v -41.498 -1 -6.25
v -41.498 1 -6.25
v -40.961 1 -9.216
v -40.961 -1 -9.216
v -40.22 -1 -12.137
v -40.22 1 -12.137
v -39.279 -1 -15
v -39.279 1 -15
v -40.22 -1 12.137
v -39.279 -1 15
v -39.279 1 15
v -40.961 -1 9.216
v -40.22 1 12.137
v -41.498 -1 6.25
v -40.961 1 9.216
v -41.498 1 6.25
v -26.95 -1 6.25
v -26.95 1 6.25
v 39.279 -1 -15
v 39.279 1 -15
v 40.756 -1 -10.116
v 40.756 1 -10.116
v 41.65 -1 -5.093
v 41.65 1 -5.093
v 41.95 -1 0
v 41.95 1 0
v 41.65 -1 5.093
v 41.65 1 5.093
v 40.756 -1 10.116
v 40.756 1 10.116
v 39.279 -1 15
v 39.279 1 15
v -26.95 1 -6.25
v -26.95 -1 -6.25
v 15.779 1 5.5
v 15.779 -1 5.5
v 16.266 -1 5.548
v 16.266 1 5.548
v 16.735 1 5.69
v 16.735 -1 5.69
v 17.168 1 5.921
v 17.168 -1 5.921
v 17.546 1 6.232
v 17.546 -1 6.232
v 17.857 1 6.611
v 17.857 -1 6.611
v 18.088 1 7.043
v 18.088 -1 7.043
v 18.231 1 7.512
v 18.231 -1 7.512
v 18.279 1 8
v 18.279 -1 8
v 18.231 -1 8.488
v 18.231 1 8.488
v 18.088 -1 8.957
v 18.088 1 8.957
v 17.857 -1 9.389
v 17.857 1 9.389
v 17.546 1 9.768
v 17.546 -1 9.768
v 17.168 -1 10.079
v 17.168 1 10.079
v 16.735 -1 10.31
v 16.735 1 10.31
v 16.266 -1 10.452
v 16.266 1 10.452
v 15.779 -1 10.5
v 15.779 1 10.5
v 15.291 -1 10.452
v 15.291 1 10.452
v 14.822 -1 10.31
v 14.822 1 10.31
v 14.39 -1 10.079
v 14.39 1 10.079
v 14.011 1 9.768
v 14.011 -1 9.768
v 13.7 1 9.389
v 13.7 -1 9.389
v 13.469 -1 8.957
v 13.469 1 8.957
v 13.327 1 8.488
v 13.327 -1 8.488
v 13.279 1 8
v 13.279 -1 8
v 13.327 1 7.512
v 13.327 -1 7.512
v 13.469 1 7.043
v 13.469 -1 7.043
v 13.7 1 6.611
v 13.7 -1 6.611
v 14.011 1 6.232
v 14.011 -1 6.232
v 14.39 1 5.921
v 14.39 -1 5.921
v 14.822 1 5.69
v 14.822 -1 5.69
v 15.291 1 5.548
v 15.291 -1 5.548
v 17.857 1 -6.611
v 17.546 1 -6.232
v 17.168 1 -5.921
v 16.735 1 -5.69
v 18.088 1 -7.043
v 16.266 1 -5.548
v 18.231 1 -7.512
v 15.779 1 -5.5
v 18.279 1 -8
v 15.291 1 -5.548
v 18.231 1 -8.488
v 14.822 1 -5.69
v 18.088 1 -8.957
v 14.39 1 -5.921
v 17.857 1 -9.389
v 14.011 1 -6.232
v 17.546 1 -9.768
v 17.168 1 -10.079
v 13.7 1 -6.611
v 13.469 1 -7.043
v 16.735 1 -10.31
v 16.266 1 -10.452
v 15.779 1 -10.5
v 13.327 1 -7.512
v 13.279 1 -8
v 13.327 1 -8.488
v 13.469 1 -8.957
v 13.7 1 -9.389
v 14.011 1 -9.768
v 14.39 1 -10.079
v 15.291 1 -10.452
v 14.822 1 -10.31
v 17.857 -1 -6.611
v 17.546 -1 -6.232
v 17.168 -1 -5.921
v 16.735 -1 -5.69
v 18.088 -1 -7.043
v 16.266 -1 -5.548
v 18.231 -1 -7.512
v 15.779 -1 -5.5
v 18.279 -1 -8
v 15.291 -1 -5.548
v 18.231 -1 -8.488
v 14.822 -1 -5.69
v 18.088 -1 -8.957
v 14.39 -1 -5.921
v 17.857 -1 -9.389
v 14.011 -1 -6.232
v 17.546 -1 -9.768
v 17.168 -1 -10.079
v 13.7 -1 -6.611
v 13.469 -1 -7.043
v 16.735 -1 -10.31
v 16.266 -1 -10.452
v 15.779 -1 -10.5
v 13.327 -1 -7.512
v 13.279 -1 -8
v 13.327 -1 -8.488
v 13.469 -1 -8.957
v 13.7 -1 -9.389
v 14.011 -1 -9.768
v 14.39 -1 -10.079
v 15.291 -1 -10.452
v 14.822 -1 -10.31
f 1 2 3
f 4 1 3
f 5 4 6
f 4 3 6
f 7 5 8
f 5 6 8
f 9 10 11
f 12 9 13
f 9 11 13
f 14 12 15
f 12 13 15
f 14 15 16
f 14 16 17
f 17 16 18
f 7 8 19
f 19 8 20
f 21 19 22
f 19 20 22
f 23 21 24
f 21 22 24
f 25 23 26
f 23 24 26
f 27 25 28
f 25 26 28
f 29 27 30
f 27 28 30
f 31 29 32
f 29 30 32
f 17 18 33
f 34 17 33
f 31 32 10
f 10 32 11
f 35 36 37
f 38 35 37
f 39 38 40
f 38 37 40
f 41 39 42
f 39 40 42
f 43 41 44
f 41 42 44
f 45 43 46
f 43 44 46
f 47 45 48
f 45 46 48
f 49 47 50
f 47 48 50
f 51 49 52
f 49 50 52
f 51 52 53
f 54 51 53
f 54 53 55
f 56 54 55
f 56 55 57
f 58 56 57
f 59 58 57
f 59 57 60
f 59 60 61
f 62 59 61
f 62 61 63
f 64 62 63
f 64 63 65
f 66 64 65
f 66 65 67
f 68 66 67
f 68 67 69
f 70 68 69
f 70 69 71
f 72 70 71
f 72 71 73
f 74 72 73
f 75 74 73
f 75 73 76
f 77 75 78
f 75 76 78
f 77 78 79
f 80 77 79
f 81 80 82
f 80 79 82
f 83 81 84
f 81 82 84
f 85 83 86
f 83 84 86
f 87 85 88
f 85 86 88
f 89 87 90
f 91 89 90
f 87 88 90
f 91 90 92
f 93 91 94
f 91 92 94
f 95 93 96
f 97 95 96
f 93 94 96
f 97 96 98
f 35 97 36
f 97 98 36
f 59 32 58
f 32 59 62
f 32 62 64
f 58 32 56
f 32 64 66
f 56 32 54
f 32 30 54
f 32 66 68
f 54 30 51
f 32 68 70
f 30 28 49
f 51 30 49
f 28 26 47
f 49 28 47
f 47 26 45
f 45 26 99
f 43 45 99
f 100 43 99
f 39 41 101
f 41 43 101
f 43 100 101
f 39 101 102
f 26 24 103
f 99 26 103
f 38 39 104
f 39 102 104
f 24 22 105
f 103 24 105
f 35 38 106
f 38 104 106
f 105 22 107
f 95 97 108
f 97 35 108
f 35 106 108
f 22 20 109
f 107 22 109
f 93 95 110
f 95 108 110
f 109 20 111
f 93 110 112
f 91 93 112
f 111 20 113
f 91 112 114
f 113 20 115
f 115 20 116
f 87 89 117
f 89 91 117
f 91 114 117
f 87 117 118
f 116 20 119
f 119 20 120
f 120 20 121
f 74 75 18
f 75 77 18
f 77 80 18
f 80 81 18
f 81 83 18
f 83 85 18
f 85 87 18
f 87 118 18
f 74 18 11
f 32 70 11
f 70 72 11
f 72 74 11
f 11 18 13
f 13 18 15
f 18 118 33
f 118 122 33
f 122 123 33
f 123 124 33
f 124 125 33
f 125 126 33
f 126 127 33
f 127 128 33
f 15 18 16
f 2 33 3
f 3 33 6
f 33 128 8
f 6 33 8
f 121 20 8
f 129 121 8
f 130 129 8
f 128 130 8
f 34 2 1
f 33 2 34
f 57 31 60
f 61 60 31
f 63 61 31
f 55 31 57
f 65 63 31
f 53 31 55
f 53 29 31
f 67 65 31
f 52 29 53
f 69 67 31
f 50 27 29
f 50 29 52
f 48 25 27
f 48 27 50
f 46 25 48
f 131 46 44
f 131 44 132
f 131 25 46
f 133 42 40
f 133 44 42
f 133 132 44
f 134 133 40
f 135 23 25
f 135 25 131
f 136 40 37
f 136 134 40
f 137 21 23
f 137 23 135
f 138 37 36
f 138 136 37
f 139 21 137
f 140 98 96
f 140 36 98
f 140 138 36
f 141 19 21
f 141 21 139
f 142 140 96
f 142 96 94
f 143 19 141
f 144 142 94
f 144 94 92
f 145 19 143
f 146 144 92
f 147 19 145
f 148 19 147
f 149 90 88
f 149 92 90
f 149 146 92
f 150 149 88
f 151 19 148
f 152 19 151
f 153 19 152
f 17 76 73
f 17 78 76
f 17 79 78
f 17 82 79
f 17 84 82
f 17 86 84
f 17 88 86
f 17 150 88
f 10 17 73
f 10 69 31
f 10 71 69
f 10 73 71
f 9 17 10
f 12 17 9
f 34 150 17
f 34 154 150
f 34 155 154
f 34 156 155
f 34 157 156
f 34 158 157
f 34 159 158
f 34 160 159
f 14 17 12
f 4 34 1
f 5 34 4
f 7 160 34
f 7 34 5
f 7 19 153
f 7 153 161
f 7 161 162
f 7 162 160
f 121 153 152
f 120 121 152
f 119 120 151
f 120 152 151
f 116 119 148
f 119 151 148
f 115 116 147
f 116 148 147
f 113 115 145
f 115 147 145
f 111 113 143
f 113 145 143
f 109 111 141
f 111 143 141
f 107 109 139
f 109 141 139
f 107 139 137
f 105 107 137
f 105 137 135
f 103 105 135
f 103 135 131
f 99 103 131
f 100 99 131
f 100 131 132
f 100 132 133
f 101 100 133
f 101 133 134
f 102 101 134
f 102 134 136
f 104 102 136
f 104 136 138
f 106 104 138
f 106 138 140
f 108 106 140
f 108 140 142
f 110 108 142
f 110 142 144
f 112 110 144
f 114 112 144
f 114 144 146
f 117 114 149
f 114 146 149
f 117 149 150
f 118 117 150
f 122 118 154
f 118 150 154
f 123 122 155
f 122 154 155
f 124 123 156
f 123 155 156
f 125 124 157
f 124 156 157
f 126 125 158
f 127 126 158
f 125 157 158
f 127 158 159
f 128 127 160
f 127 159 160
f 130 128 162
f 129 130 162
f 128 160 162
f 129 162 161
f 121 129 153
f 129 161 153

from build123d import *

# Parameters (mm, degrees)
BOSS_EXTRUDE1_DEPTH = 1
CUT_EXTRUDE1_REACH  = 46.596
SKETCH2_W           = 30
SKETCH2_H           = 12.5
CUT_EXTRUDE2_REACH  = 46.596
SKETCH3_R           = 2.5


with BuildPart() as part:
    # Sketch1 → Boss-Extrude1 (new, symmetric)
    with BuildSketch(Plane(origin=(0, 0, 0), x_dir=(1, 0, 0), z_dir=(0, 1, 0))):
        with BuildLine():
            Line((-39.278701549, 15), (39.278701549, 15))
            ThreePointArc((39.278701549, 15), (41.95, 0), (39.278701549, -15))
            Line((39.278701549, -15), (-39.278701549, -15))
            ThreePointArc((-39.278701549, -15), (-41.95, 0), (-39.278701549, 15))
        make_face()
    extrude(amount=BOSS_EXTRUDE1_DEPTH, both=True)

    # Sketch2 → Cut-Extrude1 (cut, up to next)
    with BuildSketch(Plane(origin=(0, 1, 0), x_dir=(1, 0, 0), z_dir=(0, 1, 0)), mode=Mode.PRIVATE) as cut_extrude1_sk1:
        with Locations((-41.95, 0)):
            Rectangle(SKETCH2_W, SKETCH2_H)
    cut_extrude1_tool1 = extrude(cut_extrude1_sk1.sketch, amount=-CUT_EXTRUDE1_REACH, mode=Mode.PRIVATE) & part.part
    add(cut_extrude1_tool1.solids().sort_by_distance((-41.95, 1, 0))[0], mode=Mode.SUBTRACT)

    # Sketch3 → Cut-Extrude2 (cut, up to next)
    with BuildSketch(Plane.XZ.offset(1), mode=Mode.PRIVATE) as cut_extrude2_sk1:
        with Locations(Location((15.778701549, 8, 0), (0, 0, 270))):
            Circle(SKETCH3_R)
    cut_extrude2_tool1 = extrude(cut_extrude2_sk1.sketch, amount=-CUT_EXTRUDE2_REACH, mode=Mode.PRIVATE) & part.part
    # Sketch3 → Cut-Extrude2 (cut, up to next)
    with BuildSketch(Plane.XZ.offset(1), mode=Mode.PRIVATE) as cut_extrude2_sk2:
        with Locations(Location((15.778701549, -8, 0), (0, 0, 270))):
            Circle(SKETCH3_R)
    cut_extrude2_tool2 = extrude(cut_extrude2_sk2.sketch, amount=-CUT_EXTRUDE2_REACH, mode=Mode.PRIVATE) & part.part
    add(cut_extrude2_tool1.solids().sort_by_distance((15.778702, -1, 8))[0], mode=Mode.SUBTRACT)
    add(cut_extrude2_tool2.solids().sort_by_distance((15.778702, -1, -8))[0], mode=Mode.SUBTRACT)


solid = part.part
